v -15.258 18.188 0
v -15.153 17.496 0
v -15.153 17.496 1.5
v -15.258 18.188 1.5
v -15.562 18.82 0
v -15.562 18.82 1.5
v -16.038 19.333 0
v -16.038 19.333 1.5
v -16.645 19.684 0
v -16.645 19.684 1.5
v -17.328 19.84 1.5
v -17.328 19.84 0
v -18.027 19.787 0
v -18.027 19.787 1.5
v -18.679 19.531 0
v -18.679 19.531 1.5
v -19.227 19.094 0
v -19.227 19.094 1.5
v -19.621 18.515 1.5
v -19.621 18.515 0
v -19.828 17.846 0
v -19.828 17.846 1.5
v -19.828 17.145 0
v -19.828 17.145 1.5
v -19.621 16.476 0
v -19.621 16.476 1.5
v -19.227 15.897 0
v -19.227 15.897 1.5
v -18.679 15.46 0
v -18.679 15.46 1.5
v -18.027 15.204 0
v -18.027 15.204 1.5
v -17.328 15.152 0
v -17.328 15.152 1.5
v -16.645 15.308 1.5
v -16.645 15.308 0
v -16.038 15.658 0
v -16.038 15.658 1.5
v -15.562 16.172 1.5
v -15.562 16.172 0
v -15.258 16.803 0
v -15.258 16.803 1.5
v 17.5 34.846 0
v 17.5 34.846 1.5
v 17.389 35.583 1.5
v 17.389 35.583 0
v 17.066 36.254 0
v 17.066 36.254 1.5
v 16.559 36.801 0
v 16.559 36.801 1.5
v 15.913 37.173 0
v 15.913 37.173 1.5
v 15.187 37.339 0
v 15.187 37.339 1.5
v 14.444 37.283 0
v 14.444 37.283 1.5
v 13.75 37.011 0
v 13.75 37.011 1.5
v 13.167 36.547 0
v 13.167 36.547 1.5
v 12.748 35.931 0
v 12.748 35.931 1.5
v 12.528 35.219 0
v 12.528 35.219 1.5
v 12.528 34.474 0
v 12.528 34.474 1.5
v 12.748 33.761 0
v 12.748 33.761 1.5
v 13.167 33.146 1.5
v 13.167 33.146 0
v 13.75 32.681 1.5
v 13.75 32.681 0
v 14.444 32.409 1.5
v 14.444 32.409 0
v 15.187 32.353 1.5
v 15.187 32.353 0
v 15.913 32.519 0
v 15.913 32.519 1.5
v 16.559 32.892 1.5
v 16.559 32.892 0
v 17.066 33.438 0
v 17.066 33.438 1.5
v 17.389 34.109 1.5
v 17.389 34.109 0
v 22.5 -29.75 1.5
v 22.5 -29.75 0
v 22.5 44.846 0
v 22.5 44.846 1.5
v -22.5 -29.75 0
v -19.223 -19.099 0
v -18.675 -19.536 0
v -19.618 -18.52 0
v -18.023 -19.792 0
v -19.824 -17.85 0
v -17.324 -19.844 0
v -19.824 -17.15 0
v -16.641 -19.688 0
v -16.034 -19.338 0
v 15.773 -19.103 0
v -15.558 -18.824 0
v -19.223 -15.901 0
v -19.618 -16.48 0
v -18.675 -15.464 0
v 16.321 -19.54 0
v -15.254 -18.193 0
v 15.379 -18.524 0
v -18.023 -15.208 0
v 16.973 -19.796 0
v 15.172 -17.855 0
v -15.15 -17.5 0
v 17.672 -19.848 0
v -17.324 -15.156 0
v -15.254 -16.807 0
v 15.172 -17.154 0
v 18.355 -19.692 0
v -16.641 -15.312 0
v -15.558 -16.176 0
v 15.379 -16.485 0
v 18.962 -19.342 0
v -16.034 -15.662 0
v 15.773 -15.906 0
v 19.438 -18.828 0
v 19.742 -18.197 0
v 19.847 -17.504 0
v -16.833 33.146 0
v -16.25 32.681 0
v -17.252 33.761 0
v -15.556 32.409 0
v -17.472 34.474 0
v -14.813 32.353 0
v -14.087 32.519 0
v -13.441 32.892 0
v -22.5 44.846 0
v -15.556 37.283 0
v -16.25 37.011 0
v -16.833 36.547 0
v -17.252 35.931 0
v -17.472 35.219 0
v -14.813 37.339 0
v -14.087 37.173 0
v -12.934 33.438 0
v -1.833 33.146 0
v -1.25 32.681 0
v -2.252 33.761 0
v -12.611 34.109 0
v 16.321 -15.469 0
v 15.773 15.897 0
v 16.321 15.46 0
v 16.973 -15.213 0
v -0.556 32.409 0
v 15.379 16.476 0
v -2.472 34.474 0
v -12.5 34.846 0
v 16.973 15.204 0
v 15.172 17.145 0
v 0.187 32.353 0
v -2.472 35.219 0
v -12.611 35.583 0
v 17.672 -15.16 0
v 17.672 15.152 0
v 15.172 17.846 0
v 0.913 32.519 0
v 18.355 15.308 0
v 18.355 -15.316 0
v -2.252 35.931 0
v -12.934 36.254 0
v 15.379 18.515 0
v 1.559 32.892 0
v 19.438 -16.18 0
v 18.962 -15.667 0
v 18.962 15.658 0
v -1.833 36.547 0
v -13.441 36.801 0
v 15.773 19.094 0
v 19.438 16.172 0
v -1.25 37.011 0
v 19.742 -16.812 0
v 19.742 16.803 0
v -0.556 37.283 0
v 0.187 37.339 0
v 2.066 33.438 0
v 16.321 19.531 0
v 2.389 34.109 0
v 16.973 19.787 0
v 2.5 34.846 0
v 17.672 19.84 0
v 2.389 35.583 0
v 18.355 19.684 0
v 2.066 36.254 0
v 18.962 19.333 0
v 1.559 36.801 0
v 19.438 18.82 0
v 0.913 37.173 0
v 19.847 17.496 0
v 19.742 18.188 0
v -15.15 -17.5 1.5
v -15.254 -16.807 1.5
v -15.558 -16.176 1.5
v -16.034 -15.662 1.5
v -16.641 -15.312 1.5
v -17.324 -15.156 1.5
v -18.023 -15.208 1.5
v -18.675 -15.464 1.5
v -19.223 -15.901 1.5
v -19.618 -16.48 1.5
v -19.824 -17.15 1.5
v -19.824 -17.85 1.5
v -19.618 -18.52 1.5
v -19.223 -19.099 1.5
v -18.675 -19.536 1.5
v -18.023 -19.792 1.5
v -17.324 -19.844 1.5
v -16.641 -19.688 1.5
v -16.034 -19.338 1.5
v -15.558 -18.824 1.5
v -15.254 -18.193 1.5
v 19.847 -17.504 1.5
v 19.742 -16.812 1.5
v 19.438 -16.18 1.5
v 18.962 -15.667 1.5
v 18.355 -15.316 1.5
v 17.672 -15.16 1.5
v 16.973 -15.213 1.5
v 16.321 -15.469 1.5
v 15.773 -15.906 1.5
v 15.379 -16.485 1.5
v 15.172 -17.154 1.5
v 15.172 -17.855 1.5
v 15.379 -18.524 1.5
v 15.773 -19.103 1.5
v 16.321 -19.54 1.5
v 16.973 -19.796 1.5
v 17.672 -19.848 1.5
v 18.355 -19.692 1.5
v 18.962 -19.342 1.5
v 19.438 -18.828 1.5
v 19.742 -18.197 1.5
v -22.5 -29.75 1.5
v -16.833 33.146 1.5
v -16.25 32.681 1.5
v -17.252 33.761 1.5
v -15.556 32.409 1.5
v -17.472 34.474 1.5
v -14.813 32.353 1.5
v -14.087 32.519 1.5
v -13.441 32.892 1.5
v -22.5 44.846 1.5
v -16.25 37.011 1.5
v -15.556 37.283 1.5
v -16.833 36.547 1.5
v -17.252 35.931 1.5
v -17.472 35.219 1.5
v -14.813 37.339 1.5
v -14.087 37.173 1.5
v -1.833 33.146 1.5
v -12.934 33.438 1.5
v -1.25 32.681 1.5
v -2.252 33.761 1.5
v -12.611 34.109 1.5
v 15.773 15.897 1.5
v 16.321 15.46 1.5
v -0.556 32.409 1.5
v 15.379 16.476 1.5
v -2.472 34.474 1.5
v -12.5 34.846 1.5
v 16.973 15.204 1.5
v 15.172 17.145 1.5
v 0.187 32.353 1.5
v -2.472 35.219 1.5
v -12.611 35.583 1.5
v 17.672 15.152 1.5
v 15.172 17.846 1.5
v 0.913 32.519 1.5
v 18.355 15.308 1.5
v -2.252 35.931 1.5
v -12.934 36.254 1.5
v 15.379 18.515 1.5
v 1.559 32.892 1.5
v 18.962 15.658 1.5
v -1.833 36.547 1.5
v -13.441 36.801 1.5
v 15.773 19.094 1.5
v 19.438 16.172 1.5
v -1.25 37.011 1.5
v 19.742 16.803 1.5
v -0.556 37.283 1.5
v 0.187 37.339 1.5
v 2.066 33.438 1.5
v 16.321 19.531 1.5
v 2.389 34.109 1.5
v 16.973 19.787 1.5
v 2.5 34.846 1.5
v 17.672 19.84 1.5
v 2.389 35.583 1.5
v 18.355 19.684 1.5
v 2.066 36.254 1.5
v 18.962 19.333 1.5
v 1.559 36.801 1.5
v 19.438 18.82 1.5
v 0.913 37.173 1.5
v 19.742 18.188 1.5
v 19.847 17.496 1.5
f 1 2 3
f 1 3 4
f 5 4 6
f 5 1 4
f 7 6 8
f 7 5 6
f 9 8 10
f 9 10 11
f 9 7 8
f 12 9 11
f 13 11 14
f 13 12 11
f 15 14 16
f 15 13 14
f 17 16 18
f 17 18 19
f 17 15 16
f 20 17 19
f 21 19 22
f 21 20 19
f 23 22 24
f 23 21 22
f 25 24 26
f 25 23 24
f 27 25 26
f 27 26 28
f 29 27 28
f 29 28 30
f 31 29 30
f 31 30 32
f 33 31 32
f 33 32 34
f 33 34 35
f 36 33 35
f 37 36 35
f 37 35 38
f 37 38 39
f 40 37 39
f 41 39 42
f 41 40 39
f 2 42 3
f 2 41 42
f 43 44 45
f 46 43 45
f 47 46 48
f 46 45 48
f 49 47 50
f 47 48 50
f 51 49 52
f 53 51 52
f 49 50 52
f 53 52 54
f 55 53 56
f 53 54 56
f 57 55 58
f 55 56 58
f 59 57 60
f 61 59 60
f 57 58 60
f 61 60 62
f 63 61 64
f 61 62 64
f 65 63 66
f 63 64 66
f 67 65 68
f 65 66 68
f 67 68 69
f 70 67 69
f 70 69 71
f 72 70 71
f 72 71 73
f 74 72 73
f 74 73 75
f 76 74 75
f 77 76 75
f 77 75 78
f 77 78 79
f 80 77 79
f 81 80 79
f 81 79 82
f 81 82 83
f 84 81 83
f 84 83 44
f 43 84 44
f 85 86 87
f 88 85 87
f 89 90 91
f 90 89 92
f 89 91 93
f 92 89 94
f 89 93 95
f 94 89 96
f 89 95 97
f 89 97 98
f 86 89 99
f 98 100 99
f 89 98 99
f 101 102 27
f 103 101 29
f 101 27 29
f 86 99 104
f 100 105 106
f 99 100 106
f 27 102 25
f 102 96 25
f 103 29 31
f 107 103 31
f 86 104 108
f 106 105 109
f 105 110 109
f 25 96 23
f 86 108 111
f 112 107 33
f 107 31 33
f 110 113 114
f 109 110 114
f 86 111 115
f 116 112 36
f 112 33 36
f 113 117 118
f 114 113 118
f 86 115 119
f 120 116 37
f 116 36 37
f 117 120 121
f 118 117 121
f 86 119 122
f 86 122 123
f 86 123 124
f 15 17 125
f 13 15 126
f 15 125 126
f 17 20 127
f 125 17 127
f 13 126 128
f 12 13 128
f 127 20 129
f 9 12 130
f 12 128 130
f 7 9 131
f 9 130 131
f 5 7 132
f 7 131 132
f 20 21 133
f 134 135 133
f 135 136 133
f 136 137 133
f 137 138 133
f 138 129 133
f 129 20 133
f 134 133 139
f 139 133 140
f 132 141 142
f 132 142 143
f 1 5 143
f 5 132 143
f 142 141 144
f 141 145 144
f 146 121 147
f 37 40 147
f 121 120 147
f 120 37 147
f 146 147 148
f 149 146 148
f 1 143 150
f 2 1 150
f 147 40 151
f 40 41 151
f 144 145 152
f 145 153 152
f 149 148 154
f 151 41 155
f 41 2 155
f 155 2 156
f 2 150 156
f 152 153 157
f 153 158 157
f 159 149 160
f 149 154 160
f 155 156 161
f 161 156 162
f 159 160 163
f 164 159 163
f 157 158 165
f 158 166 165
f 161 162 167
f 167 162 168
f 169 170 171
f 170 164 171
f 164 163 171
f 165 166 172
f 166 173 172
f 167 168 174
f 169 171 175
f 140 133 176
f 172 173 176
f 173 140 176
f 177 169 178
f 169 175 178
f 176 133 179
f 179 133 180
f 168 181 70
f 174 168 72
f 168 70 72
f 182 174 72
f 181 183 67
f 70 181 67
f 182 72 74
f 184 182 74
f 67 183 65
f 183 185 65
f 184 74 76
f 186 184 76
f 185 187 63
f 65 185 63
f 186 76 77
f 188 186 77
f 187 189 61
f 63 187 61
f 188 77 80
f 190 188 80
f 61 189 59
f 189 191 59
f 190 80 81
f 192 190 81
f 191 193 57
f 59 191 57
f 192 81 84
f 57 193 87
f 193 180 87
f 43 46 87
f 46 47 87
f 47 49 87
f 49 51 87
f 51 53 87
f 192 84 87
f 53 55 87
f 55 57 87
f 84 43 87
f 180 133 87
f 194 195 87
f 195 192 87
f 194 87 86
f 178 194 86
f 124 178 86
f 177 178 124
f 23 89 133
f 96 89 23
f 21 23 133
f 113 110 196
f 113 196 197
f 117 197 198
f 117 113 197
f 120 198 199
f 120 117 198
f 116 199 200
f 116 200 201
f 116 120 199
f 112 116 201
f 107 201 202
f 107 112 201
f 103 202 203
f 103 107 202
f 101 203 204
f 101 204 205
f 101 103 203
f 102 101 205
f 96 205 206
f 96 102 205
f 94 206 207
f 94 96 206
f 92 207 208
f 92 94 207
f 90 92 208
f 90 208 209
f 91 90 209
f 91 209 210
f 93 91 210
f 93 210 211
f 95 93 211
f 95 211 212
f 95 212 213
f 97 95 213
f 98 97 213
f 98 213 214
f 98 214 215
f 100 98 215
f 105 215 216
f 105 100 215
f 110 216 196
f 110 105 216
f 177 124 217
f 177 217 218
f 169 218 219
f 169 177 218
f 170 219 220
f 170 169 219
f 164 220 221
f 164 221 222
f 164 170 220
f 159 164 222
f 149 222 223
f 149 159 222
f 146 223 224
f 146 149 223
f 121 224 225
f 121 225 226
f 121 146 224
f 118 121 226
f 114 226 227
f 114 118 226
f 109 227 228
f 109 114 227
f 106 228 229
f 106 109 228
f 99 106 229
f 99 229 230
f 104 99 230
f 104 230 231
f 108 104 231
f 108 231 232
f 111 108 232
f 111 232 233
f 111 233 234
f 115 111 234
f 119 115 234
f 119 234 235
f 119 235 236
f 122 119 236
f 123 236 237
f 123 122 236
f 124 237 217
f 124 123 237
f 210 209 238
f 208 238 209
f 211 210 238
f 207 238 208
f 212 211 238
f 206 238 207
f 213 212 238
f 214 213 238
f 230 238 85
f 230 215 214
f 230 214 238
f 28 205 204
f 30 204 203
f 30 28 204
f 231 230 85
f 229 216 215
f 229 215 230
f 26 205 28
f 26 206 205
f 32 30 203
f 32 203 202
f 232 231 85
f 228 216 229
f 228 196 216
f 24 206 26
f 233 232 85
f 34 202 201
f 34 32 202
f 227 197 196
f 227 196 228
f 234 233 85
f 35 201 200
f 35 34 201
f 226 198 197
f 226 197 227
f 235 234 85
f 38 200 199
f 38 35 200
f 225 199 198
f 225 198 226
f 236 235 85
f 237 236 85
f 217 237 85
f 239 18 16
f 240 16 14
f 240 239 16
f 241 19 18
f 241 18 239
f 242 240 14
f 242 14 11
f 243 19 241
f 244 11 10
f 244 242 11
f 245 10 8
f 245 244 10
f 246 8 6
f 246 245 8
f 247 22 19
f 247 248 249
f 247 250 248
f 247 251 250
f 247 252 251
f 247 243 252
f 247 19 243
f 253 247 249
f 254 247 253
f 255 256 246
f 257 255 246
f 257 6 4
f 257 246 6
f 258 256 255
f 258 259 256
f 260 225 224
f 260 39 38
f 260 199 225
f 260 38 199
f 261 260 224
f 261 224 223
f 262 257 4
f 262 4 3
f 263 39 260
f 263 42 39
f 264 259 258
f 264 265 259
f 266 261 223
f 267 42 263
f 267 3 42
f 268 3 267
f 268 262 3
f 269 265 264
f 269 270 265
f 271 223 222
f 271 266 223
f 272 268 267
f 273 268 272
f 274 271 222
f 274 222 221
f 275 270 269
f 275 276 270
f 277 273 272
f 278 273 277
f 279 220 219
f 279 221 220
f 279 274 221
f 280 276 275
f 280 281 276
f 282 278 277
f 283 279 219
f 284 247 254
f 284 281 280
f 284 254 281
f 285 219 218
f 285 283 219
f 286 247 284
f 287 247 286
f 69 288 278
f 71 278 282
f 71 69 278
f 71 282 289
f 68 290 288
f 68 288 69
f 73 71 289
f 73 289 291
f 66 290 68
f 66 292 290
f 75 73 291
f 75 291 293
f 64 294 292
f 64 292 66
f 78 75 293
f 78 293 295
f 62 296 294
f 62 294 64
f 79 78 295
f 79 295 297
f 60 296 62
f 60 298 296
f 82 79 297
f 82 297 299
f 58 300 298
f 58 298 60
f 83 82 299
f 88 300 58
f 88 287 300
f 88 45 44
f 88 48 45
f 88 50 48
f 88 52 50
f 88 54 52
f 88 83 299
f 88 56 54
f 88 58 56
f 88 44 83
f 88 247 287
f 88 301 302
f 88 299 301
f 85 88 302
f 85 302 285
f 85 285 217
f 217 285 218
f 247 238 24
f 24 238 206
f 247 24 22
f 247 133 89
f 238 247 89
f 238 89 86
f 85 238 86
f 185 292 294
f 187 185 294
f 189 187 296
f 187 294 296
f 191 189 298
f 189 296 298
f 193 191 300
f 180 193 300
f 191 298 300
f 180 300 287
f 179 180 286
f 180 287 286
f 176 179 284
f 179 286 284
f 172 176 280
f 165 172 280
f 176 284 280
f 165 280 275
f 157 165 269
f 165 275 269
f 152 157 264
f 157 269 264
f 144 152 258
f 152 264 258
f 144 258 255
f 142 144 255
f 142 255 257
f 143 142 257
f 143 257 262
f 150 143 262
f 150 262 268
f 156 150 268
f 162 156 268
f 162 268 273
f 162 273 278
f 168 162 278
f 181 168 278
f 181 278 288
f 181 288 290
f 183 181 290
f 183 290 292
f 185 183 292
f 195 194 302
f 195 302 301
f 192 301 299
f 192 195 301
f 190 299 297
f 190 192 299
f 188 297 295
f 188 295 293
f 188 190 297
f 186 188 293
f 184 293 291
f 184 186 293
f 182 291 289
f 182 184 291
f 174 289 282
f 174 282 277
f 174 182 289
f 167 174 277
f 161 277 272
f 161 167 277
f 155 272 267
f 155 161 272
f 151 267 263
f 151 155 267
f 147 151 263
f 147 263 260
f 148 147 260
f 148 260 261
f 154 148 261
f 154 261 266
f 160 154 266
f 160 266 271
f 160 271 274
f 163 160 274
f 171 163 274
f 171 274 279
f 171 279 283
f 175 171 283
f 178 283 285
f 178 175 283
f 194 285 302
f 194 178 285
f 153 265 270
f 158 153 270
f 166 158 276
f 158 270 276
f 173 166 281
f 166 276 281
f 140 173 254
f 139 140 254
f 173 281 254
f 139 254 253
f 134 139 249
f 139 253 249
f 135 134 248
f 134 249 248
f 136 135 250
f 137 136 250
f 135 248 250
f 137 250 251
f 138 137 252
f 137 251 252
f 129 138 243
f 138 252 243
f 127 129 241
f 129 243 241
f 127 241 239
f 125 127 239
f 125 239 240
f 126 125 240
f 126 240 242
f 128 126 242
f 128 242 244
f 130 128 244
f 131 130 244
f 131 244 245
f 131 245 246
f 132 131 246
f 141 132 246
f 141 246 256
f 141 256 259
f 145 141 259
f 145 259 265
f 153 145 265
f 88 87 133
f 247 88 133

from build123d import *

# Parameters (mm, degrees)
SKETCH1_R           = 2.350480947
BOSS_EXTRUDE1_DEPTH = 1.5
CUT_EXTRUDE1_REACH  = 52.196
SKETCH2_R           = 2.5


with BuildPart() as part:
    # Sketch1 → Boss-Extrude1 (new body)
    with BuildSketch(Plane.XY):
        Polygon((-22.5, 29.75), (-22.5, -29.75), (22.5, -29.75), (22.5, 29.75), (22.5, 44.846109292), (-22.5, 44.846109292), align=None)
        with Locations((-17.503755709, 17.495628345)):
            Circle(SKETCH1_R, mode=Mode.SUBTRACT)
        with Locations((17.496244291, 17.495628345)):
            Circle(SKETCH1_R, mode=Mode.SUBTRACT)
        with Locations((17.496244291, -17.504371655)):
            Circle(SKETCH1_R, mode=Mode.SUBTRACT)
        with Locations((-17.5, -17.5)):
            Circle(SKETCH1_R, mode=Mode.SUBTRACT)
    extrude(amount=BOSS_EXTRUDE1_DEPTH)

    # Sketch2 → Cut-Extrude1 (cut, up to next)
    with BuildSketch(Plane.XY.offset(1.5), mode=Mode.PRIVATE) as cut_extrude1_sk1:
        with Locations((-15, 34.846109292)):
            Circle(SKETCH2_R)
    cut_extrude1_tool1 = extrude(cut_extrude1_sk1.sketch, amount=-CUT_EXTRUDE1_REACH, mode=Mode.PRIVATE) & part.part
    # Sketch2 → Cut-Extrude1 (cut, up to next)
    with BuildSketch(Plane.XY.offset(1.5), mode=Mode.PRIVATE) as cut_extrude1_sk2:
        with Locations((0, 34.846109292)):
            Circle(SKETCH2_R)
    cut_extrude1_tool2 = extrude(cut_extrude1_sk2.sketch, amount=-CUT_EXTRUDE1_REACH, mode=Mode.PRIVATE) & part.part
    # Sketch2 → Cut-Extrude1 (cut, up to next)
    with BuildSketch(Plane.XY.offset(1.5), mode=Mode.PRIVATE) as cut_extrude1_sk3:
        with Locations((15, 34.846109292)):
            Circle(SKETCH2_R)
    cut_extrude1_tool3 = extrude(cut_extrude1_sk3.sketch, amount=-CUT_EXTRUDE1_REACH, mode=Mode.PRIVATE) & part.part
    add(cut_extrude1_tool1.solids().sort_by_distance((-15, 34.846109, 1.5))[0], mode=Mode.SUBTRACT)
    add(cut_extrude1_tool2.solids().sort_by_distance((0, 34.846109, 1.5))[0], mode=Mode.SUBTRACT)
    add(cut_extrude1_tool3.solids().sort_by_distance((15, 34.846109, 1.5))[0], mode=Mode.SUBTRACT)


solid = part.part
